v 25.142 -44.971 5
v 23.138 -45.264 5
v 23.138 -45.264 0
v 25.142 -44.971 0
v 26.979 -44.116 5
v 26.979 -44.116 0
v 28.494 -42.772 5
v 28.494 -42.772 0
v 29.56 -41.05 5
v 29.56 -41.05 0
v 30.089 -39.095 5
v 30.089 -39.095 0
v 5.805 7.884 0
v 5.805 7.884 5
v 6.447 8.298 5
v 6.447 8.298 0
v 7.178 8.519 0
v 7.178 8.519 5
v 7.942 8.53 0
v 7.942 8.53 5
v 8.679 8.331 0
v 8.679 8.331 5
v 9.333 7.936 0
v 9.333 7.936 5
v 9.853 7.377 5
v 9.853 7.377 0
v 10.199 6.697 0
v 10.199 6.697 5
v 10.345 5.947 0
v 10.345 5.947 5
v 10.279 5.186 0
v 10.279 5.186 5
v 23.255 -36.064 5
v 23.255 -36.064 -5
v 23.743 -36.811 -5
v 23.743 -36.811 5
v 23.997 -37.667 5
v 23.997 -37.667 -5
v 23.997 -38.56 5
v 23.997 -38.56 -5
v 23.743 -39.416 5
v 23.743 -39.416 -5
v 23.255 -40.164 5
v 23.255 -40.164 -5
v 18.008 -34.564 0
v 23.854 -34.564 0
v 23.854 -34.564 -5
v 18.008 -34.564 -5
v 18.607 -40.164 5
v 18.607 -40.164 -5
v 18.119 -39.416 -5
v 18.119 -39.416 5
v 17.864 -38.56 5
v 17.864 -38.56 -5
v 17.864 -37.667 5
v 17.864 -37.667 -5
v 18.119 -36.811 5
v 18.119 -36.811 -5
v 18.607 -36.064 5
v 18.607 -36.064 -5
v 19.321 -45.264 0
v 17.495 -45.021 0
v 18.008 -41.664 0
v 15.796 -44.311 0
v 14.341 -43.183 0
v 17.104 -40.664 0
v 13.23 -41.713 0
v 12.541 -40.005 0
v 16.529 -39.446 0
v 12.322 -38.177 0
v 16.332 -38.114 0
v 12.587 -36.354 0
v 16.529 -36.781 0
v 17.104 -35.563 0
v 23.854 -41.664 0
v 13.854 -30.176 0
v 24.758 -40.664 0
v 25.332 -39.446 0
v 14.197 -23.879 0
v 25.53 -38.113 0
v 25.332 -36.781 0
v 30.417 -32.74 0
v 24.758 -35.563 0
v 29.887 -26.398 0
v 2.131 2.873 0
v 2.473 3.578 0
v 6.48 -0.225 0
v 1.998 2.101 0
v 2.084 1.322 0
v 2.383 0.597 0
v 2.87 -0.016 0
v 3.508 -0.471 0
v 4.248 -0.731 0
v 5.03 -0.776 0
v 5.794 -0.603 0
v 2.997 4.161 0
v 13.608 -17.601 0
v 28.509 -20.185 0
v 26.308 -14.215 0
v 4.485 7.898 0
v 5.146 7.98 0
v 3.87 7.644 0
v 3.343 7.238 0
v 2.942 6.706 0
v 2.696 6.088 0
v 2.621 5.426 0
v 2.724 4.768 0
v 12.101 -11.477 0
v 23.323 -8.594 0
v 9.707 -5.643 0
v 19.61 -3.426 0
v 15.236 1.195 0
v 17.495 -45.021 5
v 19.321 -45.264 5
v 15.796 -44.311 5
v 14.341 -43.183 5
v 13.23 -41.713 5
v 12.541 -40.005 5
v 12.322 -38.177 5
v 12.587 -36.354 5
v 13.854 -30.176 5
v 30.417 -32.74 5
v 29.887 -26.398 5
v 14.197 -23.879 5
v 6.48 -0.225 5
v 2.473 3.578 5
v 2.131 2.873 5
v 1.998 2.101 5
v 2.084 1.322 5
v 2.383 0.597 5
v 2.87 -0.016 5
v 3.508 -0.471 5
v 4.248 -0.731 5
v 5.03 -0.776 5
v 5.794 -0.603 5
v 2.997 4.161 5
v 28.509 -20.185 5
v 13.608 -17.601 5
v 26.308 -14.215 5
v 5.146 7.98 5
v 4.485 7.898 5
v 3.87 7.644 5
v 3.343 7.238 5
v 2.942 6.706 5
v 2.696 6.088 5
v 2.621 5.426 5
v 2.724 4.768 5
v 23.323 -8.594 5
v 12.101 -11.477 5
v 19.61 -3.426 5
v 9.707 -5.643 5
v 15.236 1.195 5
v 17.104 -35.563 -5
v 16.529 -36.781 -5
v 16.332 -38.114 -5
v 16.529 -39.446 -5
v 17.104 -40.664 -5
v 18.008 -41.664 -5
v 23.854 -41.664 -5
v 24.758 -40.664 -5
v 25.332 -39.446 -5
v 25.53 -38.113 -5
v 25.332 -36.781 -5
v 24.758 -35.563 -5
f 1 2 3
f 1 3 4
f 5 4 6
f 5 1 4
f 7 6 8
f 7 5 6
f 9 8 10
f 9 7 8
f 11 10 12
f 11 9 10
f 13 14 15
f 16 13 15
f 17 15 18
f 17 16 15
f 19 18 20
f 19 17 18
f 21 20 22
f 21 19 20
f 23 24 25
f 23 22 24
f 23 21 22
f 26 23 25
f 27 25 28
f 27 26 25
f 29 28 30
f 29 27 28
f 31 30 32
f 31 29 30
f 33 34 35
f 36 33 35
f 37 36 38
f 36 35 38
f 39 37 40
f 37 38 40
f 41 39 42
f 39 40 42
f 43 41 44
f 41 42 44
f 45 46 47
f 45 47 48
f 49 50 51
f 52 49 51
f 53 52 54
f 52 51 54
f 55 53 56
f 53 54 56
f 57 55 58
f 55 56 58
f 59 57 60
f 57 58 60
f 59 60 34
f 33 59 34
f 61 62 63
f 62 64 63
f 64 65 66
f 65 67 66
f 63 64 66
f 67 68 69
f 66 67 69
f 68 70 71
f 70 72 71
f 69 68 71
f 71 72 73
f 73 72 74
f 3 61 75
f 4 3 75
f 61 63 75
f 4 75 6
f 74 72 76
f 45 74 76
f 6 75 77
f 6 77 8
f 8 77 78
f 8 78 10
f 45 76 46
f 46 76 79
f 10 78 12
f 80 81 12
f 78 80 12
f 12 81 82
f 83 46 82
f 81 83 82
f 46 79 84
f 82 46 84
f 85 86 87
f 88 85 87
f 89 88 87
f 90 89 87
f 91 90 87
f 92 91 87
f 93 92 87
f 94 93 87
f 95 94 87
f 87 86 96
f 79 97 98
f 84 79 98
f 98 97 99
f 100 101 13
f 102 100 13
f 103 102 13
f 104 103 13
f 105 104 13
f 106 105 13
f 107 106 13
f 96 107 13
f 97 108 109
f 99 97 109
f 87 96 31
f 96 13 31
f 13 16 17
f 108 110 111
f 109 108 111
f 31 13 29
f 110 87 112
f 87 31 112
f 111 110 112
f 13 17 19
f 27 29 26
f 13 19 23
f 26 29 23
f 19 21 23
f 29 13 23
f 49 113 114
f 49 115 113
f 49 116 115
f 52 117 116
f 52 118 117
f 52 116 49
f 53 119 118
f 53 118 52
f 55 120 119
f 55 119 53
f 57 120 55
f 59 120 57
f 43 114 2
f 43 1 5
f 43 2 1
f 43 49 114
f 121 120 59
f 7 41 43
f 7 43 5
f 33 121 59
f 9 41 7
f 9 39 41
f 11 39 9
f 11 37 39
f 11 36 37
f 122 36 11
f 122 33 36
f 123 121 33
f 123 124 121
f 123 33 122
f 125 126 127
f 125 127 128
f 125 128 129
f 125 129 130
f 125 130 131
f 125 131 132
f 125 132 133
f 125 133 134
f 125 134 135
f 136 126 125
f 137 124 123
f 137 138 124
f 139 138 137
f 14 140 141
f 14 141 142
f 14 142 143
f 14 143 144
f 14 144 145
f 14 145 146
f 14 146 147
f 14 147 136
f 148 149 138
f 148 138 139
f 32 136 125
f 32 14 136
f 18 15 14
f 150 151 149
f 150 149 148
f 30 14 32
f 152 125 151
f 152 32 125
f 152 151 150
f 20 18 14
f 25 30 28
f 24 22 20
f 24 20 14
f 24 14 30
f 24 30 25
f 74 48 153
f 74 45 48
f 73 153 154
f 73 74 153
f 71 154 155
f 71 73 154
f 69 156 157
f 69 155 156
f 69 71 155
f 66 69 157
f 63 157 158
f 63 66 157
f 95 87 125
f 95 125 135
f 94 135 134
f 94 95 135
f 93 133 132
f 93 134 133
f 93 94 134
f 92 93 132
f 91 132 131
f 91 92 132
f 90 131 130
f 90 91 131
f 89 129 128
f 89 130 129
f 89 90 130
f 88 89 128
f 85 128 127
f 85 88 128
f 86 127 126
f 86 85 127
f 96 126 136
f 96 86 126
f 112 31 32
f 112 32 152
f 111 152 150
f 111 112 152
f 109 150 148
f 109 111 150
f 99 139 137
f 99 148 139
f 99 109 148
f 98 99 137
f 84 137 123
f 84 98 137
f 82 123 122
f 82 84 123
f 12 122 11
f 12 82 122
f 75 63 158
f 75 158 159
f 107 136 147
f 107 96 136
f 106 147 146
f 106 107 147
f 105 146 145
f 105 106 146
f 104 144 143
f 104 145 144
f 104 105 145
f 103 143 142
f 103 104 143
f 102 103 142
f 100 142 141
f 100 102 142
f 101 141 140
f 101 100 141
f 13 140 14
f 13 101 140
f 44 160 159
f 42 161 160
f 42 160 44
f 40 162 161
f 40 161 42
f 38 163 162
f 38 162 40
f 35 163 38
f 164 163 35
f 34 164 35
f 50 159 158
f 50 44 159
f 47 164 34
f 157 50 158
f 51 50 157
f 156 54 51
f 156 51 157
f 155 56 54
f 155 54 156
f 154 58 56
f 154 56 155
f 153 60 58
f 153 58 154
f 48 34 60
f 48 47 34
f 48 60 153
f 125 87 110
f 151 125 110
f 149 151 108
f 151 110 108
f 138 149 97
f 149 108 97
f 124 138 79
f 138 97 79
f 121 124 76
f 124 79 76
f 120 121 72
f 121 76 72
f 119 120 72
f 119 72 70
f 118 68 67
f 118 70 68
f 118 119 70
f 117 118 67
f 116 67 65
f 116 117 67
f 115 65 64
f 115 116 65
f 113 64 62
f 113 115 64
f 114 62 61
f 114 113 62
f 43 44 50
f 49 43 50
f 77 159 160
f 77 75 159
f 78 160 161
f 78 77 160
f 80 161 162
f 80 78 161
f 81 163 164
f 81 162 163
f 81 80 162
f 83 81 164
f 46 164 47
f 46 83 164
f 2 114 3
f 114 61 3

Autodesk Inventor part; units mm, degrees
ref_plane "YZ Plane" through (0, 0, 0) normal (1, 0, 0) x (0, 1, 0)
ref_plane "XZ Plane" through (0, 0, 0) normal (0, 1, 0) x (-1, 0, 0)
ref_plane "XY Plane" through (0, 0, 0) normal (0, 0, 1) x (1, 0, 0)
sketch "Sketch1" plane through (0, 0, 0) normal (0, 0, 1) x (1, 0, 0)
  arc A0 (6.3455, 7.6592) -> (2.9969, 4.161) centre (5.1207, 5.4798) ccw
  arc A1 (28.9309, -45.2636) -> (10.279, 5.1864) centre (-16.779, -33.4901) ccw
  arc A2 (8.9309, -45.2636) -> (6.4804, -0.2246) centre (-28.4708, -24.7125) ccw
  line L0 (8.9309, -45.2636) -> (28.9309, -45.2636)
  line L1 (22.9916, -36.6135) -> (18.8703, -36.6135)
  line L2 (22.9916, -39.6135) -> (18.8703, -39.6135)
  line L3 (20.9309, -34.0784) -> (20.9309, -41.4431) construction
  line L4 (22.8639, -38.1135) -> (15.5009, -38.1135) construction
  arc A3 (18.8703, -36.6135) -> (18.8703, -39.6135) centre (20.9309, -38.1135) ccw
  arc A4 (22.9916, -39.6135) -> (22.9916, -36.6135) centre (20.9309, -38.1135) ccw
  line L5 (18.6071, -36.0635) -> (23.2547, -36.0635)
  arc A5 (23.2547, -40.1635) -> (23.2547, -36.0635) centre (20.9309, -38.1135) ccw
  line L6 (23.2547, -40.1635) -> (18.6071, -40.1635)
  arc A6 (18.6071, -36.0635) -> (18.6071, -40.1635) centre (20.9309, -38.1135) ccw
  arc A7 (2.9969, 4.161) -> (6.4804, -0.2246) centre (4.7985, 2.0157) ccw
  arc A8 (10.279, 5.1864) -> (5.805, 7.8843) centre (7.5999, 5.8022) ccw
  point P0 (0, 0)
  dimension "d25" = 2.5
  dimension "d32" = 20
  dimension "d40" = 1.5
  dimension "d41" = 1.5
  dimension "d42" = 8
  dimension "d43" = 7.1502
  dimension "d44" = 0.55
extrude "Extrusion1" add sketch "Sketch1" along normal blind 5 contours A8 A1 L0 A2 A7 A0
sketch "Sketch3" plane through (0, 0, 0) normal (0, 0, -1) x (-1, 0, 0)
  line L0 (-18.6071, -36.0635) -> (-23.2547, -36.0635) projected
  arc A0 (-23.2547, -36.0635) -> (-23.2547, -40.1635) centre (-20.9309, -38.1135) ccw projected
  line L1 (-23.2547, -40.1635) -> (-18.6071, -40.1635) projected
  arc A1 (-18.6071, -40.1635) -> (-18.6071, -36.0635) centre (-20.9309, -38.1135) ccw projected
  line L2 (-23.8543, -34.5635) -> (-18.0075, -34.5635)
  arc A2 (-18.0075, -41.6635) -> (-18.0075, -34.5635) centre (-20.9309, -38.1135) ccw
  line L3 (-18.0075, -41.6635) -> (-23.8543, -41.6635)
  arc A3 (-23.8543, -34.5635) -> (-23.8543, -41.6635) centre (-20.9309, -38.1135) ccw
  point P0 (0, 0)
  dimension "d45" = 1.5
extrude "Extrusion3" add sketch "Sketch3" along normal blind 5
fillet "Fillet2" radius 7 2 edges at (8.9309, -45.2636, 2.5) (28.9309, -45.2636, 2.5)
properties part number "mavac_ruka I guesss"
